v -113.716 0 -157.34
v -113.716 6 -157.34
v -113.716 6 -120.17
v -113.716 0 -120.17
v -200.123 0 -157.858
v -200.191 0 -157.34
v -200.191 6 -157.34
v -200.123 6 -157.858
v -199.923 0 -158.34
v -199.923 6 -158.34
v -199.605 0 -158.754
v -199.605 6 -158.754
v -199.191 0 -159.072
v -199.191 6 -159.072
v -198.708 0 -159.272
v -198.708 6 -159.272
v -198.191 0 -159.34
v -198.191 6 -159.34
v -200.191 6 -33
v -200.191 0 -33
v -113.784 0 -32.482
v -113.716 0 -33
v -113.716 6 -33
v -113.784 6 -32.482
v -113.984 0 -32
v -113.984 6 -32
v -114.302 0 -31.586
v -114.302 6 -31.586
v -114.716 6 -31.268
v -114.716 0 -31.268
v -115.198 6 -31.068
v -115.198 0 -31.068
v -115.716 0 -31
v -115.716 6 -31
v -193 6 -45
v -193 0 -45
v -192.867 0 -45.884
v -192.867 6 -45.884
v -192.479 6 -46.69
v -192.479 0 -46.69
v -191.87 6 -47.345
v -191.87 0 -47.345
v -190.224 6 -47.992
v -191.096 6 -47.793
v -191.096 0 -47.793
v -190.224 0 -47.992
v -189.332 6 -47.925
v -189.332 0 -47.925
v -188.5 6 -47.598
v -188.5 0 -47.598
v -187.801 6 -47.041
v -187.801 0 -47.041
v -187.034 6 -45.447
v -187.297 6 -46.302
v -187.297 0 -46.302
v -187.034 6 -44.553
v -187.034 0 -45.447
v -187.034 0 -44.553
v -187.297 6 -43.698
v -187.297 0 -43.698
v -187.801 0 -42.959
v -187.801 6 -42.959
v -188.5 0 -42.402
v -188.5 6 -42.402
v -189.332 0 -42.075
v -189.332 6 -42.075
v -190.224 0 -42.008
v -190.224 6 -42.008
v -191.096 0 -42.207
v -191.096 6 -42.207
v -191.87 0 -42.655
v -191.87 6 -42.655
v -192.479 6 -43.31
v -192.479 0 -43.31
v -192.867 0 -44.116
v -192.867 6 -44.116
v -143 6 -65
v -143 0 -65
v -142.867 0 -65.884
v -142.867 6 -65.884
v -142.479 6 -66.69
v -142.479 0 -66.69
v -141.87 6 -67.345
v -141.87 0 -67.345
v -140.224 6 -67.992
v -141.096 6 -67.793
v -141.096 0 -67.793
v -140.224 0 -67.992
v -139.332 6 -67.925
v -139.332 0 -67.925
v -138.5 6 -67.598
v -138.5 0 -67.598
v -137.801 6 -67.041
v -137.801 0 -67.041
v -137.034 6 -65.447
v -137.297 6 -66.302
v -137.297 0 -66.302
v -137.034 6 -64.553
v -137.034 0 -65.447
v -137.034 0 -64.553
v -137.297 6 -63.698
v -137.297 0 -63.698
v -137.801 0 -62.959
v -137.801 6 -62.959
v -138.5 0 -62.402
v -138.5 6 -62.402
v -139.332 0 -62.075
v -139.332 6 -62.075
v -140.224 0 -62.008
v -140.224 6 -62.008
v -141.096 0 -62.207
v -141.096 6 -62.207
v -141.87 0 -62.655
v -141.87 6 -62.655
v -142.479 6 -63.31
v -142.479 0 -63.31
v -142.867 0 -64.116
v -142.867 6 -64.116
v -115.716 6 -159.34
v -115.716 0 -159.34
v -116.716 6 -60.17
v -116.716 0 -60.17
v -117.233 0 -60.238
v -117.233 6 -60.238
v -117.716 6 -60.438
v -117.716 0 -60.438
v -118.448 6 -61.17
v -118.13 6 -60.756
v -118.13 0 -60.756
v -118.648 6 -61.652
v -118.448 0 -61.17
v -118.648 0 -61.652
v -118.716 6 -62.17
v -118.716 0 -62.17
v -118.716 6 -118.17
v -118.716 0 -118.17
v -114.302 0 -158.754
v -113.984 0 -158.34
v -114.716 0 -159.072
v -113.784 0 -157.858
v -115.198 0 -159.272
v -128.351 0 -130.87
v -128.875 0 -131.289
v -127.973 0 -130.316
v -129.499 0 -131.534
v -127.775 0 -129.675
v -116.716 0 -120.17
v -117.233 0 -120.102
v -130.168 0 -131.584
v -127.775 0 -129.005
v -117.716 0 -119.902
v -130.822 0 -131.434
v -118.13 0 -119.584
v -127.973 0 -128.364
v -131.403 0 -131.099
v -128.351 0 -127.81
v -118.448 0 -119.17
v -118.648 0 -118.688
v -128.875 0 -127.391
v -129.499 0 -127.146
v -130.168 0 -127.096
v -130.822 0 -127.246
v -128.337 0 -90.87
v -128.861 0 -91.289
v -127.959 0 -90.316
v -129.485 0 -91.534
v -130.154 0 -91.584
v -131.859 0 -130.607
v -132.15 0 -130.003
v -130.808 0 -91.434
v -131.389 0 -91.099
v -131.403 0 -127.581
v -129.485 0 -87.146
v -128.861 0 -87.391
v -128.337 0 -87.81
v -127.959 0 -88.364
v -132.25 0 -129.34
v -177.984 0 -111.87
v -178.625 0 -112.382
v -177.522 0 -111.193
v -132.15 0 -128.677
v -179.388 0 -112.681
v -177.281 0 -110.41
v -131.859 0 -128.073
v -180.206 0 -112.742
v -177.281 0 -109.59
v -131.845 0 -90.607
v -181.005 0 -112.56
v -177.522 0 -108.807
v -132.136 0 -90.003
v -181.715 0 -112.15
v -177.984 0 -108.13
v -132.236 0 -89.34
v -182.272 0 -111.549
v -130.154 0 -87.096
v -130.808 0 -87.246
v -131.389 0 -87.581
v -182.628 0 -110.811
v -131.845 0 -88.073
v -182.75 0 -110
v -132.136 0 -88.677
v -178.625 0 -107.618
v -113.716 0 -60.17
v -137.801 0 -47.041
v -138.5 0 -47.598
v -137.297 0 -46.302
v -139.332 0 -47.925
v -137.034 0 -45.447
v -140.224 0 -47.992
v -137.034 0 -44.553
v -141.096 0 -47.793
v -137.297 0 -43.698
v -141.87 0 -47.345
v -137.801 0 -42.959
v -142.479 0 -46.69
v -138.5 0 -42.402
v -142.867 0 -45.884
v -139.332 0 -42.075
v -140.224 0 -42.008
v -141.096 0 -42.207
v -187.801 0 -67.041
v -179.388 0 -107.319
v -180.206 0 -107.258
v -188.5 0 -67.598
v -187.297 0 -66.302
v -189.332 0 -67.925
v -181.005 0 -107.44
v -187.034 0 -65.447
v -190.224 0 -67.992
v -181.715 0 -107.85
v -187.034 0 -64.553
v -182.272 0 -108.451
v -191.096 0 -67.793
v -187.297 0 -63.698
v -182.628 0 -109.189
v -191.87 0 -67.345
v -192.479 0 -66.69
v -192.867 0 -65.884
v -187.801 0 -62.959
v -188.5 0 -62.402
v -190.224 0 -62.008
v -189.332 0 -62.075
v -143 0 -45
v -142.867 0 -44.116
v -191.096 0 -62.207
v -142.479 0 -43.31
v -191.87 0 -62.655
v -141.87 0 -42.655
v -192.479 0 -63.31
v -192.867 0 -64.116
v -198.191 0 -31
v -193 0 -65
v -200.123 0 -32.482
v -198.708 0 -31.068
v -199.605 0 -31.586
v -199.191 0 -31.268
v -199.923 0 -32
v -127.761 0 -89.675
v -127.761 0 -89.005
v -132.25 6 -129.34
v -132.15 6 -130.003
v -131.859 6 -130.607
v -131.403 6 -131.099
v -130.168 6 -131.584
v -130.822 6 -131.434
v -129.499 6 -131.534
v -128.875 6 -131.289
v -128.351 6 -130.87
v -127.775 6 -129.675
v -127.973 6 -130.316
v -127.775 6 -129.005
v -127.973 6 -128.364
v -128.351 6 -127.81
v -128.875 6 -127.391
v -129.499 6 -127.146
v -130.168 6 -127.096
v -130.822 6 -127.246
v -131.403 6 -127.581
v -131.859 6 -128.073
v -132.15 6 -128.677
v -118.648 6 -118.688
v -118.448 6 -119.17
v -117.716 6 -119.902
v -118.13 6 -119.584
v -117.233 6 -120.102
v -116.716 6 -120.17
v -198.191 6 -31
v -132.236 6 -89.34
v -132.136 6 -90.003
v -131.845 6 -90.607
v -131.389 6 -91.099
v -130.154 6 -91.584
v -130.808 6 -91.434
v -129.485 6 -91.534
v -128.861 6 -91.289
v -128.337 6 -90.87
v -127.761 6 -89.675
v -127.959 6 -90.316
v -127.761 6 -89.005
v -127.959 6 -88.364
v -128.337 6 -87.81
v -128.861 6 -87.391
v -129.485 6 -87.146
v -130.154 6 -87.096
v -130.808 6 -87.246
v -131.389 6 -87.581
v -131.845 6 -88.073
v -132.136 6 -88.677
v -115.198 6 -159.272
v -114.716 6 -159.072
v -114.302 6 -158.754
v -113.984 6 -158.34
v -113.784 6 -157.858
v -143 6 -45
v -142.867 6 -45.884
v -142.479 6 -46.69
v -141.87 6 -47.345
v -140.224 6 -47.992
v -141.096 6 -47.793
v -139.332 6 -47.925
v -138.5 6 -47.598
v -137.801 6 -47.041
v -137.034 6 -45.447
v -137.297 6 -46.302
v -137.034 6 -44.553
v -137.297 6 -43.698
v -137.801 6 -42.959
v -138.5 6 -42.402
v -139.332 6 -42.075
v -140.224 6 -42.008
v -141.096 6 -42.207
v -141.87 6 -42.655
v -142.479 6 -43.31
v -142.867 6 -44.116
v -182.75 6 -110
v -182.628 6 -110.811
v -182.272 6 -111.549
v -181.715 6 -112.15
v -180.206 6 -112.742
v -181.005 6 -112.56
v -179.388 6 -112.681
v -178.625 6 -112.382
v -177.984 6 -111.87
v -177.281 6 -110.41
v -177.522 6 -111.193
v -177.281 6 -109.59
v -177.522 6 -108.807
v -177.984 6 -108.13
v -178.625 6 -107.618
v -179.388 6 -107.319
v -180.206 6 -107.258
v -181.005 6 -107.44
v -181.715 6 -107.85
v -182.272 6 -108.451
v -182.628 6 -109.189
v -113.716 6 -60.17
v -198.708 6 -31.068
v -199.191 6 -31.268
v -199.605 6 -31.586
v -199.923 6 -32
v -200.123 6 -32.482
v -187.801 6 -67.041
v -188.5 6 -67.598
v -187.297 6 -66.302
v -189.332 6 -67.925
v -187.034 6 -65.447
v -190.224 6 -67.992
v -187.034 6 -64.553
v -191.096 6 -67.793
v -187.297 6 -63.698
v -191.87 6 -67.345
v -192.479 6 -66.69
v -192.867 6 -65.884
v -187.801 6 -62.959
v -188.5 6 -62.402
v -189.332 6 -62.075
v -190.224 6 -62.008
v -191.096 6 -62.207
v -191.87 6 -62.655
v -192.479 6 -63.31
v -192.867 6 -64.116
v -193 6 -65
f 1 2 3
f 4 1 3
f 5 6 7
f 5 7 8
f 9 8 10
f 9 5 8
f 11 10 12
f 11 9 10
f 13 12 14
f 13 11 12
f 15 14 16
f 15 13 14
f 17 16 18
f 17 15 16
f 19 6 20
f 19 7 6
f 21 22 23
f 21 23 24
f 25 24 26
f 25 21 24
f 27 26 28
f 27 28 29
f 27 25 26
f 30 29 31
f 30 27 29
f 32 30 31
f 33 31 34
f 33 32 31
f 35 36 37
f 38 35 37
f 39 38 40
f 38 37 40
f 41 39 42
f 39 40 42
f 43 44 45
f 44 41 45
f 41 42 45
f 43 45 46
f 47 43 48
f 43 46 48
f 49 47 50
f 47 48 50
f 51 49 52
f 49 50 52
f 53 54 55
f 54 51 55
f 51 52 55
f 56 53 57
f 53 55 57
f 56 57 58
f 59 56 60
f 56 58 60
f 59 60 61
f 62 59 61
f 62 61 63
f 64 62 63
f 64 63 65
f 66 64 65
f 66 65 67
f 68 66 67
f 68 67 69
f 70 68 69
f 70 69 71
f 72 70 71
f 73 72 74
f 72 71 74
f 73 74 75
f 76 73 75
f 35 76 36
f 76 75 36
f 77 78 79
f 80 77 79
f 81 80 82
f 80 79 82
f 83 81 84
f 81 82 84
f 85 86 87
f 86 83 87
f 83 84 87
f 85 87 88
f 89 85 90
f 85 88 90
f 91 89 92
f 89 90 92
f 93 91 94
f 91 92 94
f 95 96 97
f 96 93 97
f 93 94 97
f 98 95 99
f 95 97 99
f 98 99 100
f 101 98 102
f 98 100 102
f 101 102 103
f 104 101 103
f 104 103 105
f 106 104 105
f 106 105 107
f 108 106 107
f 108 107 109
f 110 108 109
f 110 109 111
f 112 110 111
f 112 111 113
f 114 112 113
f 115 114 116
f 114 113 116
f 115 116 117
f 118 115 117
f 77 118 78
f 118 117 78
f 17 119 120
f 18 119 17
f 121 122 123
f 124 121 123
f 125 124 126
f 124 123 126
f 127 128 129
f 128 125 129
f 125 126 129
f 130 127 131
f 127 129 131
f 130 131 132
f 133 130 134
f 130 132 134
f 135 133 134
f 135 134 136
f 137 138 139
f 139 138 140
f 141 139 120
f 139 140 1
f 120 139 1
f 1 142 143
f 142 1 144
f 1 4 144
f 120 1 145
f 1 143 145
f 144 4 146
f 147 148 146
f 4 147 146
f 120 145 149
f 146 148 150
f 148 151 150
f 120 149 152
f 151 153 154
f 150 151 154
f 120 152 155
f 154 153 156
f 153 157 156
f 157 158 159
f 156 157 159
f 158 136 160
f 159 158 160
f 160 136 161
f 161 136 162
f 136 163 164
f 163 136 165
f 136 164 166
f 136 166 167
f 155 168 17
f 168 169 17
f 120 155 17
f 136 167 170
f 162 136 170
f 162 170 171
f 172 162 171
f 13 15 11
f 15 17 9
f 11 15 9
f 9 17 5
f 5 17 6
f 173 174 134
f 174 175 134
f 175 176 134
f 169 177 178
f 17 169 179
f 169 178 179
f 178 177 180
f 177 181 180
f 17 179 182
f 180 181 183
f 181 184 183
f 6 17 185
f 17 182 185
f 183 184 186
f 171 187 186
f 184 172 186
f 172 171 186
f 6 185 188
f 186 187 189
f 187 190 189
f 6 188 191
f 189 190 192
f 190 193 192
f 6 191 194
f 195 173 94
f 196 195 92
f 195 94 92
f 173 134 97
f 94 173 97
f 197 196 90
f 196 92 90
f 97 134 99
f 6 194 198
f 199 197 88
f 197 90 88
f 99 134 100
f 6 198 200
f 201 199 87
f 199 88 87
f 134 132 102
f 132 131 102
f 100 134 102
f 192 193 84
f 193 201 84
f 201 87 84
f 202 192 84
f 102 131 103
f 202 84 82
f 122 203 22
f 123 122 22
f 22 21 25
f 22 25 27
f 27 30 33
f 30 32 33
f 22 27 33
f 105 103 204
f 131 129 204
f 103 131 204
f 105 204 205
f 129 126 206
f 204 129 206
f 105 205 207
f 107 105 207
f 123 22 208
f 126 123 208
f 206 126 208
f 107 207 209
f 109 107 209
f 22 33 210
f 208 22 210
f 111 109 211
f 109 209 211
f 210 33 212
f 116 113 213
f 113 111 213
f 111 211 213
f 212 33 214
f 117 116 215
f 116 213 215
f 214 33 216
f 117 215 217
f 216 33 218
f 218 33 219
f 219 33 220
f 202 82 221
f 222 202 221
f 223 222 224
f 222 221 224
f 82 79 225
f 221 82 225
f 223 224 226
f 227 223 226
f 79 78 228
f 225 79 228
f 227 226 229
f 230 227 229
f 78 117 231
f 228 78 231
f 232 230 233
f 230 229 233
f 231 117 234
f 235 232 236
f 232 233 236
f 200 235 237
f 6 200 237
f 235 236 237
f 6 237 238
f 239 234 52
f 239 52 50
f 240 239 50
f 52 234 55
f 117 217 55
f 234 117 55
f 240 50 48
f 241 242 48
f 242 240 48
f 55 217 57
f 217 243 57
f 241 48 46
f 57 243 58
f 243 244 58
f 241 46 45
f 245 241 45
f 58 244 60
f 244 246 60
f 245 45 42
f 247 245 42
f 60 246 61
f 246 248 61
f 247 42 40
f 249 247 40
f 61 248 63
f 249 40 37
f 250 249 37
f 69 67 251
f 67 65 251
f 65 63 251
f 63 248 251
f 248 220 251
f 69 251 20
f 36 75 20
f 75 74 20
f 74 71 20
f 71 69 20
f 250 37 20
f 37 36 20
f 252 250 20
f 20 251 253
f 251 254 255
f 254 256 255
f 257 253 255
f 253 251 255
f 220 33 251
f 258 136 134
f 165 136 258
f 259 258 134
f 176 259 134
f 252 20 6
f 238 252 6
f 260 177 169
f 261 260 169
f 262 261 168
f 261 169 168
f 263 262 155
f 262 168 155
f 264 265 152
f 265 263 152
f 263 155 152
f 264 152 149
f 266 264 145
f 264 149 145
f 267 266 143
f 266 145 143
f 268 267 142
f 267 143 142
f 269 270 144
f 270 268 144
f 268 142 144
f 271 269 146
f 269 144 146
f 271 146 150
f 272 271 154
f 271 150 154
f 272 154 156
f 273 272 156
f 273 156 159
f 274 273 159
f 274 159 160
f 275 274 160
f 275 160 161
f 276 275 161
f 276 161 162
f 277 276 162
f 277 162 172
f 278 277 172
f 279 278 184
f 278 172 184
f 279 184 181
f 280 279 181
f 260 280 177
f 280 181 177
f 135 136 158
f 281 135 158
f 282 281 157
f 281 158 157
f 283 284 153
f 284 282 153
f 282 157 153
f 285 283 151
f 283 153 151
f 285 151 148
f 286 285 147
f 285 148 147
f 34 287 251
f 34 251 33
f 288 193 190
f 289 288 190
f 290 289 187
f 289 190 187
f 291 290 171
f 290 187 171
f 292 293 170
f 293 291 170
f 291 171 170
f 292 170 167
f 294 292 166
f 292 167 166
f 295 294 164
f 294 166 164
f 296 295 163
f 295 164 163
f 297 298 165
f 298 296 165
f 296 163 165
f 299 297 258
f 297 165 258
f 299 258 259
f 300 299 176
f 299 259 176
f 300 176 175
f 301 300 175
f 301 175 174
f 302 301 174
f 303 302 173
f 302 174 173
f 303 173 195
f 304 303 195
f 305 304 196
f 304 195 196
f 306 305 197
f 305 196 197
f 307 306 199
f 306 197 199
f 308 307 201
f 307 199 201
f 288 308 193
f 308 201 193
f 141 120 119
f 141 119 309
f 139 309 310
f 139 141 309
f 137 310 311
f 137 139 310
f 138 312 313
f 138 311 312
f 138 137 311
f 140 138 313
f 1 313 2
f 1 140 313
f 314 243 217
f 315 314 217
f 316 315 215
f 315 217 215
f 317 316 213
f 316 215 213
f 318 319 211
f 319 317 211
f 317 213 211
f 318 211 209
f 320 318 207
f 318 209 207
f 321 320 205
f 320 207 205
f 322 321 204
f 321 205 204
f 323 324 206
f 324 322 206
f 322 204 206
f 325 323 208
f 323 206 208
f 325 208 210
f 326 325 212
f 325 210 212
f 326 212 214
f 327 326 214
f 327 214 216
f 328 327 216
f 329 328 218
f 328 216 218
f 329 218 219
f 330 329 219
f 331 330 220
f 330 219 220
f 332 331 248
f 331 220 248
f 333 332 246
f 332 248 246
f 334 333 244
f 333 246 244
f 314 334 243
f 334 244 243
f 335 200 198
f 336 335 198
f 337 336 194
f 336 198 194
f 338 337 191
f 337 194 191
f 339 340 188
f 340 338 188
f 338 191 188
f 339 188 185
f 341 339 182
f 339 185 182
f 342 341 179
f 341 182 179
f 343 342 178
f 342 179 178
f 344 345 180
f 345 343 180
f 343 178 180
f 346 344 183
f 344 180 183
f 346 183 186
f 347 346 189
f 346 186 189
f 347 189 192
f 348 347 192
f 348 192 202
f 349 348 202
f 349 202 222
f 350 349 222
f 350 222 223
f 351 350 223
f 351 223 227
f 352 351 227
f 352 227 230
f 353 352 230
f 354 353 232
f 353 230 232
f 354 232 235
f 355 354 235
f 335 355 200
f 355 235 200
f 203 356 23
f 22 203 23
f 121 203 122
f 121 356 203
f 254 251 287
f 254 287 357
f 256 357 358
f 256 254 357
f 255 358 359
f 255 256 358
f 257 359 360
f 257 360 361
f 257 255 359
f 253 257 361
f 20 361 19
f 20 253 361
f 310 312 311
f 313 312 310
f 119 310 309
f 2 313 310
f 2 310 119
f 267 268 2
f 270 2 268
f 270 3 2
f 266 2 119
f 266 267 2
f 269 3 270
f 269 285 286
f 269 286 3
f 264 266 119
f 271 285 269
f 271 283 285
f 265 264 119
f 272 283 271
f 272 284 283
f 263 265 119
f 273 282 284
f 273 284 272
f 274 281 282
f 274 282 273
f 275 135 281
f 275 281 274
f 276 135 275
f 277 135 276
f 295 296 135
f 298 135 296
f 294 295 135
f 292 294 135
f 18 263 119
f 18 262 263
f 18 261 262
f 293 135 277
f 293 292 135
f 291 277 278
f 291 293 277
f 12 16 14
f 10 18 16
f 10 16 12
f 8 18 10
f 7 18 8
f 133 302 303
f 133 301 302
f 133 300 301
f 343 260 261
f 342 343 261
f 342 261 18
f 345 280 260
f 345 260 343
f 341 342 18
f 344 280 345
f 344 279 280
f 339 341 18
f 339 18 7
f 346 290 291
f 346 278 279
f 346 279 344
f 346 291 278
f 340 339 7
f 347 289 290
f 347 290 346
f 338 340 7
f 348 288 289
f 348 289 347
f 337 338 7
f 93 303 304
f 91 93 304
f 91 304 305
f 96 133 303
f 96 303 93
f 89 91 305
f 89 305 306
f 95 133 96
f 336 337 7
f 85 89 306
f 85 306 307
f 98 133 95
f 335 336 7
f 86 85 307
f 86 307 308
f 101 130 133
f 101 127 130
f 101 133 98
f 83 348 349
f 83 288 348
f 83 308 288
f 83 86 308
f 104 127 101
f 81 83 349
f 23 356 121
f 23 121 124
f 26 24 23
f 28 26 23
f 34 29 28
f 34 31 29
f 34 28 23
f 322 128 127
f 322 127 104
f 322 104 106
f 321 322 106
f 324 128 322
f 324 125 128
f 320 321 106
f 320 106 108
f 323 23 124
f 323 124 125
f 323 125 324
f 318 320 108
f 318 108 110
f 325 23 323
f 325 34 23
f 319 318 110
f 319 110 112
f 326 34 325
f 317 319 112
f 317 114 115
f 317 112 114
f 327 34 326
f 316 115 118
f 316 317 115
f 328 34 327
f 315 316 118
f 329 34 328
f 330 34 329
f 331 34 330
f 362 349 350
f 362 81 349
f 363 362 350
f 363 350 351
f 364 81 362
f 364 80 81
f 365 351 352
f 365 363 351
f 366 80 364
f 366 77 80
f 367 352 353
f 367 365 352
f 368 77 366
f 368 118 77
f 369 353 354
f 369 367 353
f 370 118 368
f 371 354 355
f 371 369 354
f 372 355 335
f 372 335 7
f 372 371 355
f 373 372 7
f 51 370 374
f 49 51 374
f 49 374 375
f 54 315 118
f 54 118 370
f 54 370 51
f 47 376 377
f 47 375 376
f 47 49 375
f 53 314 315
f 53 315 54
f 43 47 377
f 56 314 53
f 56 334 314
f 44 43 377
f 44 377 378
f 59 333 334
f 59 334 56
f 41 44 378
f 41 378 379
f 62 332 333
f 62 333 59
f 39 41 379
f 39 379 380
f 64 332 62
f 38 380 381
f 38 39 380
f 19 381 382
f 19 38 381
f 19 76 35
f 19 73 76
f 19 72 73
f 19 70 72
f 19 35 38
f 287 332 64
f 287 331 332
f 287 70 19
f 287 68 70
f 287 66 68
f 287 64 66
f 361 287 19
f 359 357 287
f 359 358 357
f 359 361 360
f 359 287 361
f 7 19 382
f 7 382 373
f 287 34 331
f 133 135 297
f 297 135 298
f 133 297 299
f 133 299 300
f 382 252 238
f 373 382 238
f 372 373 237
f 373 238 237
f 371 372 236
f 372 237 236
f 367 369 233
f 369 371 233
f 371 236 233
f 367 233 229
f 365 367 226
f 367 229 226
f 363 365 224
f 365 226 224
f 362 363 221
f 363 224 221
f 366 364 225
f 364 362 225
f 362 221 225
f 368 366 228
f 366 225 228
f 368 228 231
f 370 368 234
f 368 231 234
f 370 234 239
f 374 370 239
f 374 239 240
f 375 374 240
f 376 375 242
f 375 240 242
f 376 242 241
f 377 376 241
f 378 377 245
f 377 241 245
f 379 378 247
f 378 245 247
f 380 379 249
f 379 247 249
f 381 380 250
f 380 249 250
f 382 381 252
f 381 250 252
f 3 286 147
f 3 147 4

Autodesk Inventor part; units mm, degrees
ref_plane "YZ Plane" through (0, 0, 0) normal (1, 0, 0) x (0, 1, 0)
ref_plane "XZ Plane" through (0, 0, 0) normal (0, 1, 0) x (-1, 0, 0)
ref_plane "XY Plane" through (0, 0, 0) normal (0, 0, 1) x (1, 0, 0)
sketch "Sketch1" plane through (0, 0, 0) normal (0, 1, 0) x (-1, 0, 0)
  line L0 (232.1908, -176.5808) -> (232.1908, -3.7592)
  arc A0 (232.1908, -3.7592) -> (227.4316, 1) centre (227.4316, -3.7592) ccw
  line L1 (227.4316, 1) -> (0, 1)
  arc A1 (0, 1) -> (-4.7592, -3.7592) centre (0, -3.7592) ccw
  arc A2 (-4.7592, -176.5808) -> (0, -181.34) centre (0, -176.5808) ccw
  arc A3 (227.4316, -181.34) -> (232.1908, -176.5808) centre (227.4316, -176.5808) ccw
  circle A4 centre (130, -129.34) radius 2.25
  circle A5 centre (129.9861, -89.34) radius 2.25
  circle A6 centre (90, -129.34) radius 2.25
  circle A7 centre (89.9861, -89.34) radius 2.25
  circle A8 centre (180, -110) radius 2.75
  circle A9 centre (55, -110) radius 2.75
  circle A10 centre (90, -45) radius 3
  circle A11 centre (190, -45) radius 3
  circle A12 centre (190, -65) radius 3
  circle A13 centre (90, -65) radius 3
  circle A14 centre (140, -45) radius 3
  circle A15 centre (40, -45) radius 3
  circle A16 centre (140, -65) radius 3
  circle A17 centre (40, -65) radius 3
  line L2 (230.1908, -176.5808) -> (230.1908, -3.7592)
  arc A18 (230.1908, -3.7592) -> (227.4316, -1) centre (227.4316, -3.7592) ccw
  line L3 (227.4316, -1) -> (0, -1)
  arc A19 (0, -1) -> (-2.7592, -3.7592) centre (0, -3.7592) ccw
  arc A20 (-2.7592, -176.5808) -> (0, -179.34) centre (0, -176.5808) ccw
  arc A21 (227.4316, -179.34) -> (230.1908, -176.5808) centre (227.4316, -176.5808) ccw
  line L4 (-4.7592, -3.7592) -> (-4.7592, -176.5808)
  line L5 (-2.7592, -3.7592) -> (-2.7592, -176.5808)
  line L6 (0, -179.34) -> (227.4316, -179.34)
  line L7 (227.4316, -181.34) -> (0, -181.34)
  line L8 (0, 0) -> (0, -15)
  line L9 (0, 0) -> (15, 0) construction
  line L10 (0, 0) -> (15, 0)
  line L11 (0, 0) -> (15, 0) construction
  circle A22 centre (20, -155) radius 2.25
  circle A23 centre (76, -155) radius 2.25
  circle A24 centre (20, -99) radius 2.25
  point P0 (230.1908, -3.7592)
  point P1 (0, -1)
  dimension "d0" = 2
  dimension "d1" = 2
  dimension "d2" = 2
  dimension "d3" = 2
  dimension "d5" = 2
  dimension "d7" = 2
  dimension "d8" = 227.4316
  dimension "d9" = 172.8216
  dimension "d10" = 4.7592
  dimension "d45" = 15
  dimension "d46" = 90
  dimension "d47" = 15
  dimension "d48" = 0
  dimension "d49" = 110
  dimension "d50" = 55
  dimension "d51" = 125
  dimension "d52" = 110
  dimension "d54" = 40
  dimension "d55" = 40
  dimension "d56" = 40
  dimension "d57" = 40
  dimension "d58" = 50
  dimension "d59" = 100.1908
  dimension "d60" = 2.7592
  dimension "d61" = 1
  dimension "d62" = 4.7592
  dimension "d63" = 178.34
  dimension "d64" = 180.34
  dimension "d65" = 172.8216
  dimension "d66" = 230.1908
  dimension "d67" = 4.5
  dimension "d68" = 5.5
  dimension "d69" = 6
  dimension "d70" = 40.1908
  dimension "d71" = 64
  dimension "d72" = 20
  dimension "d73" = 50
  dimension "d74" = 50
  dimension "d75" = 50
  dimension "d76" = 20
  dimension "d77" = 20
  dimension "d78" = 20
  dimension "d79" = 50
  dimension "d87" = 4.5
  dimension "d89" = 45
  dimension "d90" = 35
  dimension "d91" = 4.5
  dimension "d92" = 56
  dimension "d93" = 4.5
  dimension "d94" = 56
extrude "Extrusion1" add sketch "Sketch1" along normal blind 6 contours A21 L6 A20 L5 A19 L3 A18 L2
sketch "Sketch2" plane through (0, 6, 0) normal (0, 1, 0) x (1, 0, 0)
  line L0 (-232.1908, 176.5808) -> (-232.1908, 3.7592)
  arc A0 (-232.1908, 3.7592) -> (-227.4316, -1) centre (-227.4316, 3.7592) ccw
  line L1 (-227.4316, -1) -> (0, -1)
  arc A1 (0, -1) -> (4.7592, 3.7592) centre (0, 3.7592) ccw
  arc A2 (4.7592, 176.5808) -> (0, 181.34) centre (0, 176.5808) ccw
  arc A3 (-227.4316, 181.34) -> (-232.1908, 176.5808) centre (-227.4316, 176.5808) ccw
  line L2 (-230.1908, 176.5808) -> (-230.1908, 3.7592)
  arc A4 (-230.1908, 3.7592) -> (-227.4316, 1) centre (-227.4316, 3.7592) ccw
  line L3 (-227.4316, 1) -> (0, 1)
  arc A5 (0, 1) -> (2.7592, 3.7592) centre (0, 3.7592) ccw
  arc A6 (2.7592, 176.5808) -> (0, 179.34) centre (0, 176.5808) ccw
  arc A7 (-227.4316, 179.34) -> (-230.1908, 176.5808) centre (-227.4316, 176.5808) ccw
  line L4 (4.7592, 3.7592) -> (4.7592, 176.5808)
  line L5 (2.7592, 3.7592) -> (2.7592, 176.5808)
  line L6 (0, 179.34) -> (-227.4316, 179.34)
  line L7 (-227.4316, 181.34) -> (0, 181.34)
  line L8 (0, 179.34) -> (-227.4316, 179.34) projected
  line L9 (-113.7158, 179.34) -> (-113.7158, 1)
  line L10 (-227.4316, 1) -> (0, 1) projected
  line L11 (-118.7158, 120.17) -> (-108.7158, 120.17)
  line L12 (-108.7158, 120.17) -> (-108.7158, 60.17)
  line L13 (-108.7158, 60.17) -> (-118.7158, 60.17)
  line L14 (-118.7158, 60.17) -> (-118.7158, 120.17)
  line L15 (-118.7158, 120.17) -> (-108.7158, 60.17) construction
  line L16 (-108.7158, 120.17) -> (-118.7158, 60.17) construction
  line L17 (-113.7158, 179.34) -> (-113.7158, 179.34)
  line L18 (2.7592, 159.34) -> (-230.1908, 159.34)
  line L19 (-230.1908, 159.34) -> (-230.1908, 199.34)
  line L20 (-230.1908, 199.34) -> (2.7592, 199.34)
  line L21 (2.7592, 199.34) -> (2.7592, 159.34)
  line L22 (2.7592, 159.34) -> (-230.1908, 199.34) construction
  line L23 (-230.1908, 159.34) -> (2.7592, 199.34) construction
  line L24 (-113.7158, 1) -> (-113.7158, 16)
  line L25 (-230.1908, 31) -> (2.7592, 31)
  line L26 (2.7592, 31) -> (2.7592, 1)
  line L27 (2.7592, 1) -> (-230.1908, 1)
  line L28 (-230.1908, 1) -> (-230.1908, 31)
  line L29 (-230.1908, 31) -> (2.7592, 1) construction
  line L30 (2.7592, 31) -> (-230.1908, 1) construction
  line L31 (-227.4316, 1) -> (0, 1) projected
  line L32 (-230.1908, 199.34) -> (-200.1908, 199.34)
  line L33 (-200.1908, 199.34) -> (-200.1908, 1)
  line L34 (-200.1908, 1) -> (-230.1908, 1)
  line L35 (-230.1908, 1) -> (-230.1908, 199.34)
  line L36 (2.7592, 1) -> (-7.2408, 1)
  line L37 (-7.2408, 1) -> (-7.2408, 199.34)
  line L38 (-7.2408, 199.34) -> (2.7592, 199.34)
  line L39 (2.7592, 199.34) -> (2.7592, 1)
  point P0 (230.1908, -176.5808)
  point P1 (230.1908, -3.7592)
  point P2 (227.4316, -1)
  point P3 (0, -1)
  point P4 (0, 0)
  point P5 (230.1908, -176.5808)
  point P6 (230.1908, -3.7592)
  point P7 (227.4316, -1)
  point P8 (0, -1)
  point P9 (-113.7158, 90.17)
  point P10 (-113.7158, 120.17)
  point P11 (-113.7158, 60.17)
  point P12 (-113.7158, 1)
  point P13 (0, 1)
  point P14 (-230.1908, 3.7592)
  point P15 (-227.4316, 1)
  point P16 (-113.7158, 159.34)
  point P17 (-7.2408, 159.34)
  point P18 (-7.2408, 31)
  point P19 (-113.7158, 31)
  point P20 (2.7592, 3.7592)
  point P21 (2.7592, 176.5808)
  point P22 (-7.2408, 179.34)
  point P23 (-200.1908, 159.34)
  point P24 (-200.1908, 31)
  dimension "d22" = 2
  dimension "d23" = 2
  dimension "d24" = 2
  dimension "d25" = 2
  dimension "d26" = 2
  dimension "d27" = 2
  dimension "d28" = 227.4316
  dimension "d29" = 172.8216
  dimension "d30" = 4.7592
  dimension "d31" = 10
  dimension "d32" = 60
  dimension "d37" = 0
  dimension "d38" = 40
  dimension "d39" = 15
  dimension "d40" = 30
  dimension "d41" = 30
  dimension "d42" = 10
extrude "Extrusion4" cut sketch "Sketch2" against normal through all contours A7 L6 L33 L18 L2 | L18 L33 L25 L2 | L37 L20 L21 A2 L7 | L7 A2 L21 A6 L6 L37 | L6 L9 L18 L33 | L25 L33 L3 A4 L2 | L37 L18 L9 L6 | L6 A6 L5 L18 L37 | L25 L9 L3 L33 | L18 L37 L25 L9 L13 L12 L11 | L18 L5 L25 L37 | L25 L37 L3 L9 | L11 L12 L13 L9 | L9 L13 L14 L11 | L25 L5 A5 L3 L37 | L26 L27 A5
fillet "Fillet4" radius 2 6 edges at (-113.7158, 3, -31) (-200.1908, 3, -31) (-118.7158, 3, -120.17) (-118.7158, 3, -60.17) (-113.7158, 3, -159.34) (-200.1908, 3, -159.34)
equation "\"d1\" = d0"
equation "\"d2\" = d0"
equation "\"d3\" = d0"
equation "\"d5\" = d0"
equation "\"d7\" = d0"
equation "\"d23\" = d22"
equation "\"d24\" = d22"
equation "\"d25\" = d22"
equation "\"d26\" = d22"
equation "\"d27\" = d22"
properties part number "EboxBottom_1"
